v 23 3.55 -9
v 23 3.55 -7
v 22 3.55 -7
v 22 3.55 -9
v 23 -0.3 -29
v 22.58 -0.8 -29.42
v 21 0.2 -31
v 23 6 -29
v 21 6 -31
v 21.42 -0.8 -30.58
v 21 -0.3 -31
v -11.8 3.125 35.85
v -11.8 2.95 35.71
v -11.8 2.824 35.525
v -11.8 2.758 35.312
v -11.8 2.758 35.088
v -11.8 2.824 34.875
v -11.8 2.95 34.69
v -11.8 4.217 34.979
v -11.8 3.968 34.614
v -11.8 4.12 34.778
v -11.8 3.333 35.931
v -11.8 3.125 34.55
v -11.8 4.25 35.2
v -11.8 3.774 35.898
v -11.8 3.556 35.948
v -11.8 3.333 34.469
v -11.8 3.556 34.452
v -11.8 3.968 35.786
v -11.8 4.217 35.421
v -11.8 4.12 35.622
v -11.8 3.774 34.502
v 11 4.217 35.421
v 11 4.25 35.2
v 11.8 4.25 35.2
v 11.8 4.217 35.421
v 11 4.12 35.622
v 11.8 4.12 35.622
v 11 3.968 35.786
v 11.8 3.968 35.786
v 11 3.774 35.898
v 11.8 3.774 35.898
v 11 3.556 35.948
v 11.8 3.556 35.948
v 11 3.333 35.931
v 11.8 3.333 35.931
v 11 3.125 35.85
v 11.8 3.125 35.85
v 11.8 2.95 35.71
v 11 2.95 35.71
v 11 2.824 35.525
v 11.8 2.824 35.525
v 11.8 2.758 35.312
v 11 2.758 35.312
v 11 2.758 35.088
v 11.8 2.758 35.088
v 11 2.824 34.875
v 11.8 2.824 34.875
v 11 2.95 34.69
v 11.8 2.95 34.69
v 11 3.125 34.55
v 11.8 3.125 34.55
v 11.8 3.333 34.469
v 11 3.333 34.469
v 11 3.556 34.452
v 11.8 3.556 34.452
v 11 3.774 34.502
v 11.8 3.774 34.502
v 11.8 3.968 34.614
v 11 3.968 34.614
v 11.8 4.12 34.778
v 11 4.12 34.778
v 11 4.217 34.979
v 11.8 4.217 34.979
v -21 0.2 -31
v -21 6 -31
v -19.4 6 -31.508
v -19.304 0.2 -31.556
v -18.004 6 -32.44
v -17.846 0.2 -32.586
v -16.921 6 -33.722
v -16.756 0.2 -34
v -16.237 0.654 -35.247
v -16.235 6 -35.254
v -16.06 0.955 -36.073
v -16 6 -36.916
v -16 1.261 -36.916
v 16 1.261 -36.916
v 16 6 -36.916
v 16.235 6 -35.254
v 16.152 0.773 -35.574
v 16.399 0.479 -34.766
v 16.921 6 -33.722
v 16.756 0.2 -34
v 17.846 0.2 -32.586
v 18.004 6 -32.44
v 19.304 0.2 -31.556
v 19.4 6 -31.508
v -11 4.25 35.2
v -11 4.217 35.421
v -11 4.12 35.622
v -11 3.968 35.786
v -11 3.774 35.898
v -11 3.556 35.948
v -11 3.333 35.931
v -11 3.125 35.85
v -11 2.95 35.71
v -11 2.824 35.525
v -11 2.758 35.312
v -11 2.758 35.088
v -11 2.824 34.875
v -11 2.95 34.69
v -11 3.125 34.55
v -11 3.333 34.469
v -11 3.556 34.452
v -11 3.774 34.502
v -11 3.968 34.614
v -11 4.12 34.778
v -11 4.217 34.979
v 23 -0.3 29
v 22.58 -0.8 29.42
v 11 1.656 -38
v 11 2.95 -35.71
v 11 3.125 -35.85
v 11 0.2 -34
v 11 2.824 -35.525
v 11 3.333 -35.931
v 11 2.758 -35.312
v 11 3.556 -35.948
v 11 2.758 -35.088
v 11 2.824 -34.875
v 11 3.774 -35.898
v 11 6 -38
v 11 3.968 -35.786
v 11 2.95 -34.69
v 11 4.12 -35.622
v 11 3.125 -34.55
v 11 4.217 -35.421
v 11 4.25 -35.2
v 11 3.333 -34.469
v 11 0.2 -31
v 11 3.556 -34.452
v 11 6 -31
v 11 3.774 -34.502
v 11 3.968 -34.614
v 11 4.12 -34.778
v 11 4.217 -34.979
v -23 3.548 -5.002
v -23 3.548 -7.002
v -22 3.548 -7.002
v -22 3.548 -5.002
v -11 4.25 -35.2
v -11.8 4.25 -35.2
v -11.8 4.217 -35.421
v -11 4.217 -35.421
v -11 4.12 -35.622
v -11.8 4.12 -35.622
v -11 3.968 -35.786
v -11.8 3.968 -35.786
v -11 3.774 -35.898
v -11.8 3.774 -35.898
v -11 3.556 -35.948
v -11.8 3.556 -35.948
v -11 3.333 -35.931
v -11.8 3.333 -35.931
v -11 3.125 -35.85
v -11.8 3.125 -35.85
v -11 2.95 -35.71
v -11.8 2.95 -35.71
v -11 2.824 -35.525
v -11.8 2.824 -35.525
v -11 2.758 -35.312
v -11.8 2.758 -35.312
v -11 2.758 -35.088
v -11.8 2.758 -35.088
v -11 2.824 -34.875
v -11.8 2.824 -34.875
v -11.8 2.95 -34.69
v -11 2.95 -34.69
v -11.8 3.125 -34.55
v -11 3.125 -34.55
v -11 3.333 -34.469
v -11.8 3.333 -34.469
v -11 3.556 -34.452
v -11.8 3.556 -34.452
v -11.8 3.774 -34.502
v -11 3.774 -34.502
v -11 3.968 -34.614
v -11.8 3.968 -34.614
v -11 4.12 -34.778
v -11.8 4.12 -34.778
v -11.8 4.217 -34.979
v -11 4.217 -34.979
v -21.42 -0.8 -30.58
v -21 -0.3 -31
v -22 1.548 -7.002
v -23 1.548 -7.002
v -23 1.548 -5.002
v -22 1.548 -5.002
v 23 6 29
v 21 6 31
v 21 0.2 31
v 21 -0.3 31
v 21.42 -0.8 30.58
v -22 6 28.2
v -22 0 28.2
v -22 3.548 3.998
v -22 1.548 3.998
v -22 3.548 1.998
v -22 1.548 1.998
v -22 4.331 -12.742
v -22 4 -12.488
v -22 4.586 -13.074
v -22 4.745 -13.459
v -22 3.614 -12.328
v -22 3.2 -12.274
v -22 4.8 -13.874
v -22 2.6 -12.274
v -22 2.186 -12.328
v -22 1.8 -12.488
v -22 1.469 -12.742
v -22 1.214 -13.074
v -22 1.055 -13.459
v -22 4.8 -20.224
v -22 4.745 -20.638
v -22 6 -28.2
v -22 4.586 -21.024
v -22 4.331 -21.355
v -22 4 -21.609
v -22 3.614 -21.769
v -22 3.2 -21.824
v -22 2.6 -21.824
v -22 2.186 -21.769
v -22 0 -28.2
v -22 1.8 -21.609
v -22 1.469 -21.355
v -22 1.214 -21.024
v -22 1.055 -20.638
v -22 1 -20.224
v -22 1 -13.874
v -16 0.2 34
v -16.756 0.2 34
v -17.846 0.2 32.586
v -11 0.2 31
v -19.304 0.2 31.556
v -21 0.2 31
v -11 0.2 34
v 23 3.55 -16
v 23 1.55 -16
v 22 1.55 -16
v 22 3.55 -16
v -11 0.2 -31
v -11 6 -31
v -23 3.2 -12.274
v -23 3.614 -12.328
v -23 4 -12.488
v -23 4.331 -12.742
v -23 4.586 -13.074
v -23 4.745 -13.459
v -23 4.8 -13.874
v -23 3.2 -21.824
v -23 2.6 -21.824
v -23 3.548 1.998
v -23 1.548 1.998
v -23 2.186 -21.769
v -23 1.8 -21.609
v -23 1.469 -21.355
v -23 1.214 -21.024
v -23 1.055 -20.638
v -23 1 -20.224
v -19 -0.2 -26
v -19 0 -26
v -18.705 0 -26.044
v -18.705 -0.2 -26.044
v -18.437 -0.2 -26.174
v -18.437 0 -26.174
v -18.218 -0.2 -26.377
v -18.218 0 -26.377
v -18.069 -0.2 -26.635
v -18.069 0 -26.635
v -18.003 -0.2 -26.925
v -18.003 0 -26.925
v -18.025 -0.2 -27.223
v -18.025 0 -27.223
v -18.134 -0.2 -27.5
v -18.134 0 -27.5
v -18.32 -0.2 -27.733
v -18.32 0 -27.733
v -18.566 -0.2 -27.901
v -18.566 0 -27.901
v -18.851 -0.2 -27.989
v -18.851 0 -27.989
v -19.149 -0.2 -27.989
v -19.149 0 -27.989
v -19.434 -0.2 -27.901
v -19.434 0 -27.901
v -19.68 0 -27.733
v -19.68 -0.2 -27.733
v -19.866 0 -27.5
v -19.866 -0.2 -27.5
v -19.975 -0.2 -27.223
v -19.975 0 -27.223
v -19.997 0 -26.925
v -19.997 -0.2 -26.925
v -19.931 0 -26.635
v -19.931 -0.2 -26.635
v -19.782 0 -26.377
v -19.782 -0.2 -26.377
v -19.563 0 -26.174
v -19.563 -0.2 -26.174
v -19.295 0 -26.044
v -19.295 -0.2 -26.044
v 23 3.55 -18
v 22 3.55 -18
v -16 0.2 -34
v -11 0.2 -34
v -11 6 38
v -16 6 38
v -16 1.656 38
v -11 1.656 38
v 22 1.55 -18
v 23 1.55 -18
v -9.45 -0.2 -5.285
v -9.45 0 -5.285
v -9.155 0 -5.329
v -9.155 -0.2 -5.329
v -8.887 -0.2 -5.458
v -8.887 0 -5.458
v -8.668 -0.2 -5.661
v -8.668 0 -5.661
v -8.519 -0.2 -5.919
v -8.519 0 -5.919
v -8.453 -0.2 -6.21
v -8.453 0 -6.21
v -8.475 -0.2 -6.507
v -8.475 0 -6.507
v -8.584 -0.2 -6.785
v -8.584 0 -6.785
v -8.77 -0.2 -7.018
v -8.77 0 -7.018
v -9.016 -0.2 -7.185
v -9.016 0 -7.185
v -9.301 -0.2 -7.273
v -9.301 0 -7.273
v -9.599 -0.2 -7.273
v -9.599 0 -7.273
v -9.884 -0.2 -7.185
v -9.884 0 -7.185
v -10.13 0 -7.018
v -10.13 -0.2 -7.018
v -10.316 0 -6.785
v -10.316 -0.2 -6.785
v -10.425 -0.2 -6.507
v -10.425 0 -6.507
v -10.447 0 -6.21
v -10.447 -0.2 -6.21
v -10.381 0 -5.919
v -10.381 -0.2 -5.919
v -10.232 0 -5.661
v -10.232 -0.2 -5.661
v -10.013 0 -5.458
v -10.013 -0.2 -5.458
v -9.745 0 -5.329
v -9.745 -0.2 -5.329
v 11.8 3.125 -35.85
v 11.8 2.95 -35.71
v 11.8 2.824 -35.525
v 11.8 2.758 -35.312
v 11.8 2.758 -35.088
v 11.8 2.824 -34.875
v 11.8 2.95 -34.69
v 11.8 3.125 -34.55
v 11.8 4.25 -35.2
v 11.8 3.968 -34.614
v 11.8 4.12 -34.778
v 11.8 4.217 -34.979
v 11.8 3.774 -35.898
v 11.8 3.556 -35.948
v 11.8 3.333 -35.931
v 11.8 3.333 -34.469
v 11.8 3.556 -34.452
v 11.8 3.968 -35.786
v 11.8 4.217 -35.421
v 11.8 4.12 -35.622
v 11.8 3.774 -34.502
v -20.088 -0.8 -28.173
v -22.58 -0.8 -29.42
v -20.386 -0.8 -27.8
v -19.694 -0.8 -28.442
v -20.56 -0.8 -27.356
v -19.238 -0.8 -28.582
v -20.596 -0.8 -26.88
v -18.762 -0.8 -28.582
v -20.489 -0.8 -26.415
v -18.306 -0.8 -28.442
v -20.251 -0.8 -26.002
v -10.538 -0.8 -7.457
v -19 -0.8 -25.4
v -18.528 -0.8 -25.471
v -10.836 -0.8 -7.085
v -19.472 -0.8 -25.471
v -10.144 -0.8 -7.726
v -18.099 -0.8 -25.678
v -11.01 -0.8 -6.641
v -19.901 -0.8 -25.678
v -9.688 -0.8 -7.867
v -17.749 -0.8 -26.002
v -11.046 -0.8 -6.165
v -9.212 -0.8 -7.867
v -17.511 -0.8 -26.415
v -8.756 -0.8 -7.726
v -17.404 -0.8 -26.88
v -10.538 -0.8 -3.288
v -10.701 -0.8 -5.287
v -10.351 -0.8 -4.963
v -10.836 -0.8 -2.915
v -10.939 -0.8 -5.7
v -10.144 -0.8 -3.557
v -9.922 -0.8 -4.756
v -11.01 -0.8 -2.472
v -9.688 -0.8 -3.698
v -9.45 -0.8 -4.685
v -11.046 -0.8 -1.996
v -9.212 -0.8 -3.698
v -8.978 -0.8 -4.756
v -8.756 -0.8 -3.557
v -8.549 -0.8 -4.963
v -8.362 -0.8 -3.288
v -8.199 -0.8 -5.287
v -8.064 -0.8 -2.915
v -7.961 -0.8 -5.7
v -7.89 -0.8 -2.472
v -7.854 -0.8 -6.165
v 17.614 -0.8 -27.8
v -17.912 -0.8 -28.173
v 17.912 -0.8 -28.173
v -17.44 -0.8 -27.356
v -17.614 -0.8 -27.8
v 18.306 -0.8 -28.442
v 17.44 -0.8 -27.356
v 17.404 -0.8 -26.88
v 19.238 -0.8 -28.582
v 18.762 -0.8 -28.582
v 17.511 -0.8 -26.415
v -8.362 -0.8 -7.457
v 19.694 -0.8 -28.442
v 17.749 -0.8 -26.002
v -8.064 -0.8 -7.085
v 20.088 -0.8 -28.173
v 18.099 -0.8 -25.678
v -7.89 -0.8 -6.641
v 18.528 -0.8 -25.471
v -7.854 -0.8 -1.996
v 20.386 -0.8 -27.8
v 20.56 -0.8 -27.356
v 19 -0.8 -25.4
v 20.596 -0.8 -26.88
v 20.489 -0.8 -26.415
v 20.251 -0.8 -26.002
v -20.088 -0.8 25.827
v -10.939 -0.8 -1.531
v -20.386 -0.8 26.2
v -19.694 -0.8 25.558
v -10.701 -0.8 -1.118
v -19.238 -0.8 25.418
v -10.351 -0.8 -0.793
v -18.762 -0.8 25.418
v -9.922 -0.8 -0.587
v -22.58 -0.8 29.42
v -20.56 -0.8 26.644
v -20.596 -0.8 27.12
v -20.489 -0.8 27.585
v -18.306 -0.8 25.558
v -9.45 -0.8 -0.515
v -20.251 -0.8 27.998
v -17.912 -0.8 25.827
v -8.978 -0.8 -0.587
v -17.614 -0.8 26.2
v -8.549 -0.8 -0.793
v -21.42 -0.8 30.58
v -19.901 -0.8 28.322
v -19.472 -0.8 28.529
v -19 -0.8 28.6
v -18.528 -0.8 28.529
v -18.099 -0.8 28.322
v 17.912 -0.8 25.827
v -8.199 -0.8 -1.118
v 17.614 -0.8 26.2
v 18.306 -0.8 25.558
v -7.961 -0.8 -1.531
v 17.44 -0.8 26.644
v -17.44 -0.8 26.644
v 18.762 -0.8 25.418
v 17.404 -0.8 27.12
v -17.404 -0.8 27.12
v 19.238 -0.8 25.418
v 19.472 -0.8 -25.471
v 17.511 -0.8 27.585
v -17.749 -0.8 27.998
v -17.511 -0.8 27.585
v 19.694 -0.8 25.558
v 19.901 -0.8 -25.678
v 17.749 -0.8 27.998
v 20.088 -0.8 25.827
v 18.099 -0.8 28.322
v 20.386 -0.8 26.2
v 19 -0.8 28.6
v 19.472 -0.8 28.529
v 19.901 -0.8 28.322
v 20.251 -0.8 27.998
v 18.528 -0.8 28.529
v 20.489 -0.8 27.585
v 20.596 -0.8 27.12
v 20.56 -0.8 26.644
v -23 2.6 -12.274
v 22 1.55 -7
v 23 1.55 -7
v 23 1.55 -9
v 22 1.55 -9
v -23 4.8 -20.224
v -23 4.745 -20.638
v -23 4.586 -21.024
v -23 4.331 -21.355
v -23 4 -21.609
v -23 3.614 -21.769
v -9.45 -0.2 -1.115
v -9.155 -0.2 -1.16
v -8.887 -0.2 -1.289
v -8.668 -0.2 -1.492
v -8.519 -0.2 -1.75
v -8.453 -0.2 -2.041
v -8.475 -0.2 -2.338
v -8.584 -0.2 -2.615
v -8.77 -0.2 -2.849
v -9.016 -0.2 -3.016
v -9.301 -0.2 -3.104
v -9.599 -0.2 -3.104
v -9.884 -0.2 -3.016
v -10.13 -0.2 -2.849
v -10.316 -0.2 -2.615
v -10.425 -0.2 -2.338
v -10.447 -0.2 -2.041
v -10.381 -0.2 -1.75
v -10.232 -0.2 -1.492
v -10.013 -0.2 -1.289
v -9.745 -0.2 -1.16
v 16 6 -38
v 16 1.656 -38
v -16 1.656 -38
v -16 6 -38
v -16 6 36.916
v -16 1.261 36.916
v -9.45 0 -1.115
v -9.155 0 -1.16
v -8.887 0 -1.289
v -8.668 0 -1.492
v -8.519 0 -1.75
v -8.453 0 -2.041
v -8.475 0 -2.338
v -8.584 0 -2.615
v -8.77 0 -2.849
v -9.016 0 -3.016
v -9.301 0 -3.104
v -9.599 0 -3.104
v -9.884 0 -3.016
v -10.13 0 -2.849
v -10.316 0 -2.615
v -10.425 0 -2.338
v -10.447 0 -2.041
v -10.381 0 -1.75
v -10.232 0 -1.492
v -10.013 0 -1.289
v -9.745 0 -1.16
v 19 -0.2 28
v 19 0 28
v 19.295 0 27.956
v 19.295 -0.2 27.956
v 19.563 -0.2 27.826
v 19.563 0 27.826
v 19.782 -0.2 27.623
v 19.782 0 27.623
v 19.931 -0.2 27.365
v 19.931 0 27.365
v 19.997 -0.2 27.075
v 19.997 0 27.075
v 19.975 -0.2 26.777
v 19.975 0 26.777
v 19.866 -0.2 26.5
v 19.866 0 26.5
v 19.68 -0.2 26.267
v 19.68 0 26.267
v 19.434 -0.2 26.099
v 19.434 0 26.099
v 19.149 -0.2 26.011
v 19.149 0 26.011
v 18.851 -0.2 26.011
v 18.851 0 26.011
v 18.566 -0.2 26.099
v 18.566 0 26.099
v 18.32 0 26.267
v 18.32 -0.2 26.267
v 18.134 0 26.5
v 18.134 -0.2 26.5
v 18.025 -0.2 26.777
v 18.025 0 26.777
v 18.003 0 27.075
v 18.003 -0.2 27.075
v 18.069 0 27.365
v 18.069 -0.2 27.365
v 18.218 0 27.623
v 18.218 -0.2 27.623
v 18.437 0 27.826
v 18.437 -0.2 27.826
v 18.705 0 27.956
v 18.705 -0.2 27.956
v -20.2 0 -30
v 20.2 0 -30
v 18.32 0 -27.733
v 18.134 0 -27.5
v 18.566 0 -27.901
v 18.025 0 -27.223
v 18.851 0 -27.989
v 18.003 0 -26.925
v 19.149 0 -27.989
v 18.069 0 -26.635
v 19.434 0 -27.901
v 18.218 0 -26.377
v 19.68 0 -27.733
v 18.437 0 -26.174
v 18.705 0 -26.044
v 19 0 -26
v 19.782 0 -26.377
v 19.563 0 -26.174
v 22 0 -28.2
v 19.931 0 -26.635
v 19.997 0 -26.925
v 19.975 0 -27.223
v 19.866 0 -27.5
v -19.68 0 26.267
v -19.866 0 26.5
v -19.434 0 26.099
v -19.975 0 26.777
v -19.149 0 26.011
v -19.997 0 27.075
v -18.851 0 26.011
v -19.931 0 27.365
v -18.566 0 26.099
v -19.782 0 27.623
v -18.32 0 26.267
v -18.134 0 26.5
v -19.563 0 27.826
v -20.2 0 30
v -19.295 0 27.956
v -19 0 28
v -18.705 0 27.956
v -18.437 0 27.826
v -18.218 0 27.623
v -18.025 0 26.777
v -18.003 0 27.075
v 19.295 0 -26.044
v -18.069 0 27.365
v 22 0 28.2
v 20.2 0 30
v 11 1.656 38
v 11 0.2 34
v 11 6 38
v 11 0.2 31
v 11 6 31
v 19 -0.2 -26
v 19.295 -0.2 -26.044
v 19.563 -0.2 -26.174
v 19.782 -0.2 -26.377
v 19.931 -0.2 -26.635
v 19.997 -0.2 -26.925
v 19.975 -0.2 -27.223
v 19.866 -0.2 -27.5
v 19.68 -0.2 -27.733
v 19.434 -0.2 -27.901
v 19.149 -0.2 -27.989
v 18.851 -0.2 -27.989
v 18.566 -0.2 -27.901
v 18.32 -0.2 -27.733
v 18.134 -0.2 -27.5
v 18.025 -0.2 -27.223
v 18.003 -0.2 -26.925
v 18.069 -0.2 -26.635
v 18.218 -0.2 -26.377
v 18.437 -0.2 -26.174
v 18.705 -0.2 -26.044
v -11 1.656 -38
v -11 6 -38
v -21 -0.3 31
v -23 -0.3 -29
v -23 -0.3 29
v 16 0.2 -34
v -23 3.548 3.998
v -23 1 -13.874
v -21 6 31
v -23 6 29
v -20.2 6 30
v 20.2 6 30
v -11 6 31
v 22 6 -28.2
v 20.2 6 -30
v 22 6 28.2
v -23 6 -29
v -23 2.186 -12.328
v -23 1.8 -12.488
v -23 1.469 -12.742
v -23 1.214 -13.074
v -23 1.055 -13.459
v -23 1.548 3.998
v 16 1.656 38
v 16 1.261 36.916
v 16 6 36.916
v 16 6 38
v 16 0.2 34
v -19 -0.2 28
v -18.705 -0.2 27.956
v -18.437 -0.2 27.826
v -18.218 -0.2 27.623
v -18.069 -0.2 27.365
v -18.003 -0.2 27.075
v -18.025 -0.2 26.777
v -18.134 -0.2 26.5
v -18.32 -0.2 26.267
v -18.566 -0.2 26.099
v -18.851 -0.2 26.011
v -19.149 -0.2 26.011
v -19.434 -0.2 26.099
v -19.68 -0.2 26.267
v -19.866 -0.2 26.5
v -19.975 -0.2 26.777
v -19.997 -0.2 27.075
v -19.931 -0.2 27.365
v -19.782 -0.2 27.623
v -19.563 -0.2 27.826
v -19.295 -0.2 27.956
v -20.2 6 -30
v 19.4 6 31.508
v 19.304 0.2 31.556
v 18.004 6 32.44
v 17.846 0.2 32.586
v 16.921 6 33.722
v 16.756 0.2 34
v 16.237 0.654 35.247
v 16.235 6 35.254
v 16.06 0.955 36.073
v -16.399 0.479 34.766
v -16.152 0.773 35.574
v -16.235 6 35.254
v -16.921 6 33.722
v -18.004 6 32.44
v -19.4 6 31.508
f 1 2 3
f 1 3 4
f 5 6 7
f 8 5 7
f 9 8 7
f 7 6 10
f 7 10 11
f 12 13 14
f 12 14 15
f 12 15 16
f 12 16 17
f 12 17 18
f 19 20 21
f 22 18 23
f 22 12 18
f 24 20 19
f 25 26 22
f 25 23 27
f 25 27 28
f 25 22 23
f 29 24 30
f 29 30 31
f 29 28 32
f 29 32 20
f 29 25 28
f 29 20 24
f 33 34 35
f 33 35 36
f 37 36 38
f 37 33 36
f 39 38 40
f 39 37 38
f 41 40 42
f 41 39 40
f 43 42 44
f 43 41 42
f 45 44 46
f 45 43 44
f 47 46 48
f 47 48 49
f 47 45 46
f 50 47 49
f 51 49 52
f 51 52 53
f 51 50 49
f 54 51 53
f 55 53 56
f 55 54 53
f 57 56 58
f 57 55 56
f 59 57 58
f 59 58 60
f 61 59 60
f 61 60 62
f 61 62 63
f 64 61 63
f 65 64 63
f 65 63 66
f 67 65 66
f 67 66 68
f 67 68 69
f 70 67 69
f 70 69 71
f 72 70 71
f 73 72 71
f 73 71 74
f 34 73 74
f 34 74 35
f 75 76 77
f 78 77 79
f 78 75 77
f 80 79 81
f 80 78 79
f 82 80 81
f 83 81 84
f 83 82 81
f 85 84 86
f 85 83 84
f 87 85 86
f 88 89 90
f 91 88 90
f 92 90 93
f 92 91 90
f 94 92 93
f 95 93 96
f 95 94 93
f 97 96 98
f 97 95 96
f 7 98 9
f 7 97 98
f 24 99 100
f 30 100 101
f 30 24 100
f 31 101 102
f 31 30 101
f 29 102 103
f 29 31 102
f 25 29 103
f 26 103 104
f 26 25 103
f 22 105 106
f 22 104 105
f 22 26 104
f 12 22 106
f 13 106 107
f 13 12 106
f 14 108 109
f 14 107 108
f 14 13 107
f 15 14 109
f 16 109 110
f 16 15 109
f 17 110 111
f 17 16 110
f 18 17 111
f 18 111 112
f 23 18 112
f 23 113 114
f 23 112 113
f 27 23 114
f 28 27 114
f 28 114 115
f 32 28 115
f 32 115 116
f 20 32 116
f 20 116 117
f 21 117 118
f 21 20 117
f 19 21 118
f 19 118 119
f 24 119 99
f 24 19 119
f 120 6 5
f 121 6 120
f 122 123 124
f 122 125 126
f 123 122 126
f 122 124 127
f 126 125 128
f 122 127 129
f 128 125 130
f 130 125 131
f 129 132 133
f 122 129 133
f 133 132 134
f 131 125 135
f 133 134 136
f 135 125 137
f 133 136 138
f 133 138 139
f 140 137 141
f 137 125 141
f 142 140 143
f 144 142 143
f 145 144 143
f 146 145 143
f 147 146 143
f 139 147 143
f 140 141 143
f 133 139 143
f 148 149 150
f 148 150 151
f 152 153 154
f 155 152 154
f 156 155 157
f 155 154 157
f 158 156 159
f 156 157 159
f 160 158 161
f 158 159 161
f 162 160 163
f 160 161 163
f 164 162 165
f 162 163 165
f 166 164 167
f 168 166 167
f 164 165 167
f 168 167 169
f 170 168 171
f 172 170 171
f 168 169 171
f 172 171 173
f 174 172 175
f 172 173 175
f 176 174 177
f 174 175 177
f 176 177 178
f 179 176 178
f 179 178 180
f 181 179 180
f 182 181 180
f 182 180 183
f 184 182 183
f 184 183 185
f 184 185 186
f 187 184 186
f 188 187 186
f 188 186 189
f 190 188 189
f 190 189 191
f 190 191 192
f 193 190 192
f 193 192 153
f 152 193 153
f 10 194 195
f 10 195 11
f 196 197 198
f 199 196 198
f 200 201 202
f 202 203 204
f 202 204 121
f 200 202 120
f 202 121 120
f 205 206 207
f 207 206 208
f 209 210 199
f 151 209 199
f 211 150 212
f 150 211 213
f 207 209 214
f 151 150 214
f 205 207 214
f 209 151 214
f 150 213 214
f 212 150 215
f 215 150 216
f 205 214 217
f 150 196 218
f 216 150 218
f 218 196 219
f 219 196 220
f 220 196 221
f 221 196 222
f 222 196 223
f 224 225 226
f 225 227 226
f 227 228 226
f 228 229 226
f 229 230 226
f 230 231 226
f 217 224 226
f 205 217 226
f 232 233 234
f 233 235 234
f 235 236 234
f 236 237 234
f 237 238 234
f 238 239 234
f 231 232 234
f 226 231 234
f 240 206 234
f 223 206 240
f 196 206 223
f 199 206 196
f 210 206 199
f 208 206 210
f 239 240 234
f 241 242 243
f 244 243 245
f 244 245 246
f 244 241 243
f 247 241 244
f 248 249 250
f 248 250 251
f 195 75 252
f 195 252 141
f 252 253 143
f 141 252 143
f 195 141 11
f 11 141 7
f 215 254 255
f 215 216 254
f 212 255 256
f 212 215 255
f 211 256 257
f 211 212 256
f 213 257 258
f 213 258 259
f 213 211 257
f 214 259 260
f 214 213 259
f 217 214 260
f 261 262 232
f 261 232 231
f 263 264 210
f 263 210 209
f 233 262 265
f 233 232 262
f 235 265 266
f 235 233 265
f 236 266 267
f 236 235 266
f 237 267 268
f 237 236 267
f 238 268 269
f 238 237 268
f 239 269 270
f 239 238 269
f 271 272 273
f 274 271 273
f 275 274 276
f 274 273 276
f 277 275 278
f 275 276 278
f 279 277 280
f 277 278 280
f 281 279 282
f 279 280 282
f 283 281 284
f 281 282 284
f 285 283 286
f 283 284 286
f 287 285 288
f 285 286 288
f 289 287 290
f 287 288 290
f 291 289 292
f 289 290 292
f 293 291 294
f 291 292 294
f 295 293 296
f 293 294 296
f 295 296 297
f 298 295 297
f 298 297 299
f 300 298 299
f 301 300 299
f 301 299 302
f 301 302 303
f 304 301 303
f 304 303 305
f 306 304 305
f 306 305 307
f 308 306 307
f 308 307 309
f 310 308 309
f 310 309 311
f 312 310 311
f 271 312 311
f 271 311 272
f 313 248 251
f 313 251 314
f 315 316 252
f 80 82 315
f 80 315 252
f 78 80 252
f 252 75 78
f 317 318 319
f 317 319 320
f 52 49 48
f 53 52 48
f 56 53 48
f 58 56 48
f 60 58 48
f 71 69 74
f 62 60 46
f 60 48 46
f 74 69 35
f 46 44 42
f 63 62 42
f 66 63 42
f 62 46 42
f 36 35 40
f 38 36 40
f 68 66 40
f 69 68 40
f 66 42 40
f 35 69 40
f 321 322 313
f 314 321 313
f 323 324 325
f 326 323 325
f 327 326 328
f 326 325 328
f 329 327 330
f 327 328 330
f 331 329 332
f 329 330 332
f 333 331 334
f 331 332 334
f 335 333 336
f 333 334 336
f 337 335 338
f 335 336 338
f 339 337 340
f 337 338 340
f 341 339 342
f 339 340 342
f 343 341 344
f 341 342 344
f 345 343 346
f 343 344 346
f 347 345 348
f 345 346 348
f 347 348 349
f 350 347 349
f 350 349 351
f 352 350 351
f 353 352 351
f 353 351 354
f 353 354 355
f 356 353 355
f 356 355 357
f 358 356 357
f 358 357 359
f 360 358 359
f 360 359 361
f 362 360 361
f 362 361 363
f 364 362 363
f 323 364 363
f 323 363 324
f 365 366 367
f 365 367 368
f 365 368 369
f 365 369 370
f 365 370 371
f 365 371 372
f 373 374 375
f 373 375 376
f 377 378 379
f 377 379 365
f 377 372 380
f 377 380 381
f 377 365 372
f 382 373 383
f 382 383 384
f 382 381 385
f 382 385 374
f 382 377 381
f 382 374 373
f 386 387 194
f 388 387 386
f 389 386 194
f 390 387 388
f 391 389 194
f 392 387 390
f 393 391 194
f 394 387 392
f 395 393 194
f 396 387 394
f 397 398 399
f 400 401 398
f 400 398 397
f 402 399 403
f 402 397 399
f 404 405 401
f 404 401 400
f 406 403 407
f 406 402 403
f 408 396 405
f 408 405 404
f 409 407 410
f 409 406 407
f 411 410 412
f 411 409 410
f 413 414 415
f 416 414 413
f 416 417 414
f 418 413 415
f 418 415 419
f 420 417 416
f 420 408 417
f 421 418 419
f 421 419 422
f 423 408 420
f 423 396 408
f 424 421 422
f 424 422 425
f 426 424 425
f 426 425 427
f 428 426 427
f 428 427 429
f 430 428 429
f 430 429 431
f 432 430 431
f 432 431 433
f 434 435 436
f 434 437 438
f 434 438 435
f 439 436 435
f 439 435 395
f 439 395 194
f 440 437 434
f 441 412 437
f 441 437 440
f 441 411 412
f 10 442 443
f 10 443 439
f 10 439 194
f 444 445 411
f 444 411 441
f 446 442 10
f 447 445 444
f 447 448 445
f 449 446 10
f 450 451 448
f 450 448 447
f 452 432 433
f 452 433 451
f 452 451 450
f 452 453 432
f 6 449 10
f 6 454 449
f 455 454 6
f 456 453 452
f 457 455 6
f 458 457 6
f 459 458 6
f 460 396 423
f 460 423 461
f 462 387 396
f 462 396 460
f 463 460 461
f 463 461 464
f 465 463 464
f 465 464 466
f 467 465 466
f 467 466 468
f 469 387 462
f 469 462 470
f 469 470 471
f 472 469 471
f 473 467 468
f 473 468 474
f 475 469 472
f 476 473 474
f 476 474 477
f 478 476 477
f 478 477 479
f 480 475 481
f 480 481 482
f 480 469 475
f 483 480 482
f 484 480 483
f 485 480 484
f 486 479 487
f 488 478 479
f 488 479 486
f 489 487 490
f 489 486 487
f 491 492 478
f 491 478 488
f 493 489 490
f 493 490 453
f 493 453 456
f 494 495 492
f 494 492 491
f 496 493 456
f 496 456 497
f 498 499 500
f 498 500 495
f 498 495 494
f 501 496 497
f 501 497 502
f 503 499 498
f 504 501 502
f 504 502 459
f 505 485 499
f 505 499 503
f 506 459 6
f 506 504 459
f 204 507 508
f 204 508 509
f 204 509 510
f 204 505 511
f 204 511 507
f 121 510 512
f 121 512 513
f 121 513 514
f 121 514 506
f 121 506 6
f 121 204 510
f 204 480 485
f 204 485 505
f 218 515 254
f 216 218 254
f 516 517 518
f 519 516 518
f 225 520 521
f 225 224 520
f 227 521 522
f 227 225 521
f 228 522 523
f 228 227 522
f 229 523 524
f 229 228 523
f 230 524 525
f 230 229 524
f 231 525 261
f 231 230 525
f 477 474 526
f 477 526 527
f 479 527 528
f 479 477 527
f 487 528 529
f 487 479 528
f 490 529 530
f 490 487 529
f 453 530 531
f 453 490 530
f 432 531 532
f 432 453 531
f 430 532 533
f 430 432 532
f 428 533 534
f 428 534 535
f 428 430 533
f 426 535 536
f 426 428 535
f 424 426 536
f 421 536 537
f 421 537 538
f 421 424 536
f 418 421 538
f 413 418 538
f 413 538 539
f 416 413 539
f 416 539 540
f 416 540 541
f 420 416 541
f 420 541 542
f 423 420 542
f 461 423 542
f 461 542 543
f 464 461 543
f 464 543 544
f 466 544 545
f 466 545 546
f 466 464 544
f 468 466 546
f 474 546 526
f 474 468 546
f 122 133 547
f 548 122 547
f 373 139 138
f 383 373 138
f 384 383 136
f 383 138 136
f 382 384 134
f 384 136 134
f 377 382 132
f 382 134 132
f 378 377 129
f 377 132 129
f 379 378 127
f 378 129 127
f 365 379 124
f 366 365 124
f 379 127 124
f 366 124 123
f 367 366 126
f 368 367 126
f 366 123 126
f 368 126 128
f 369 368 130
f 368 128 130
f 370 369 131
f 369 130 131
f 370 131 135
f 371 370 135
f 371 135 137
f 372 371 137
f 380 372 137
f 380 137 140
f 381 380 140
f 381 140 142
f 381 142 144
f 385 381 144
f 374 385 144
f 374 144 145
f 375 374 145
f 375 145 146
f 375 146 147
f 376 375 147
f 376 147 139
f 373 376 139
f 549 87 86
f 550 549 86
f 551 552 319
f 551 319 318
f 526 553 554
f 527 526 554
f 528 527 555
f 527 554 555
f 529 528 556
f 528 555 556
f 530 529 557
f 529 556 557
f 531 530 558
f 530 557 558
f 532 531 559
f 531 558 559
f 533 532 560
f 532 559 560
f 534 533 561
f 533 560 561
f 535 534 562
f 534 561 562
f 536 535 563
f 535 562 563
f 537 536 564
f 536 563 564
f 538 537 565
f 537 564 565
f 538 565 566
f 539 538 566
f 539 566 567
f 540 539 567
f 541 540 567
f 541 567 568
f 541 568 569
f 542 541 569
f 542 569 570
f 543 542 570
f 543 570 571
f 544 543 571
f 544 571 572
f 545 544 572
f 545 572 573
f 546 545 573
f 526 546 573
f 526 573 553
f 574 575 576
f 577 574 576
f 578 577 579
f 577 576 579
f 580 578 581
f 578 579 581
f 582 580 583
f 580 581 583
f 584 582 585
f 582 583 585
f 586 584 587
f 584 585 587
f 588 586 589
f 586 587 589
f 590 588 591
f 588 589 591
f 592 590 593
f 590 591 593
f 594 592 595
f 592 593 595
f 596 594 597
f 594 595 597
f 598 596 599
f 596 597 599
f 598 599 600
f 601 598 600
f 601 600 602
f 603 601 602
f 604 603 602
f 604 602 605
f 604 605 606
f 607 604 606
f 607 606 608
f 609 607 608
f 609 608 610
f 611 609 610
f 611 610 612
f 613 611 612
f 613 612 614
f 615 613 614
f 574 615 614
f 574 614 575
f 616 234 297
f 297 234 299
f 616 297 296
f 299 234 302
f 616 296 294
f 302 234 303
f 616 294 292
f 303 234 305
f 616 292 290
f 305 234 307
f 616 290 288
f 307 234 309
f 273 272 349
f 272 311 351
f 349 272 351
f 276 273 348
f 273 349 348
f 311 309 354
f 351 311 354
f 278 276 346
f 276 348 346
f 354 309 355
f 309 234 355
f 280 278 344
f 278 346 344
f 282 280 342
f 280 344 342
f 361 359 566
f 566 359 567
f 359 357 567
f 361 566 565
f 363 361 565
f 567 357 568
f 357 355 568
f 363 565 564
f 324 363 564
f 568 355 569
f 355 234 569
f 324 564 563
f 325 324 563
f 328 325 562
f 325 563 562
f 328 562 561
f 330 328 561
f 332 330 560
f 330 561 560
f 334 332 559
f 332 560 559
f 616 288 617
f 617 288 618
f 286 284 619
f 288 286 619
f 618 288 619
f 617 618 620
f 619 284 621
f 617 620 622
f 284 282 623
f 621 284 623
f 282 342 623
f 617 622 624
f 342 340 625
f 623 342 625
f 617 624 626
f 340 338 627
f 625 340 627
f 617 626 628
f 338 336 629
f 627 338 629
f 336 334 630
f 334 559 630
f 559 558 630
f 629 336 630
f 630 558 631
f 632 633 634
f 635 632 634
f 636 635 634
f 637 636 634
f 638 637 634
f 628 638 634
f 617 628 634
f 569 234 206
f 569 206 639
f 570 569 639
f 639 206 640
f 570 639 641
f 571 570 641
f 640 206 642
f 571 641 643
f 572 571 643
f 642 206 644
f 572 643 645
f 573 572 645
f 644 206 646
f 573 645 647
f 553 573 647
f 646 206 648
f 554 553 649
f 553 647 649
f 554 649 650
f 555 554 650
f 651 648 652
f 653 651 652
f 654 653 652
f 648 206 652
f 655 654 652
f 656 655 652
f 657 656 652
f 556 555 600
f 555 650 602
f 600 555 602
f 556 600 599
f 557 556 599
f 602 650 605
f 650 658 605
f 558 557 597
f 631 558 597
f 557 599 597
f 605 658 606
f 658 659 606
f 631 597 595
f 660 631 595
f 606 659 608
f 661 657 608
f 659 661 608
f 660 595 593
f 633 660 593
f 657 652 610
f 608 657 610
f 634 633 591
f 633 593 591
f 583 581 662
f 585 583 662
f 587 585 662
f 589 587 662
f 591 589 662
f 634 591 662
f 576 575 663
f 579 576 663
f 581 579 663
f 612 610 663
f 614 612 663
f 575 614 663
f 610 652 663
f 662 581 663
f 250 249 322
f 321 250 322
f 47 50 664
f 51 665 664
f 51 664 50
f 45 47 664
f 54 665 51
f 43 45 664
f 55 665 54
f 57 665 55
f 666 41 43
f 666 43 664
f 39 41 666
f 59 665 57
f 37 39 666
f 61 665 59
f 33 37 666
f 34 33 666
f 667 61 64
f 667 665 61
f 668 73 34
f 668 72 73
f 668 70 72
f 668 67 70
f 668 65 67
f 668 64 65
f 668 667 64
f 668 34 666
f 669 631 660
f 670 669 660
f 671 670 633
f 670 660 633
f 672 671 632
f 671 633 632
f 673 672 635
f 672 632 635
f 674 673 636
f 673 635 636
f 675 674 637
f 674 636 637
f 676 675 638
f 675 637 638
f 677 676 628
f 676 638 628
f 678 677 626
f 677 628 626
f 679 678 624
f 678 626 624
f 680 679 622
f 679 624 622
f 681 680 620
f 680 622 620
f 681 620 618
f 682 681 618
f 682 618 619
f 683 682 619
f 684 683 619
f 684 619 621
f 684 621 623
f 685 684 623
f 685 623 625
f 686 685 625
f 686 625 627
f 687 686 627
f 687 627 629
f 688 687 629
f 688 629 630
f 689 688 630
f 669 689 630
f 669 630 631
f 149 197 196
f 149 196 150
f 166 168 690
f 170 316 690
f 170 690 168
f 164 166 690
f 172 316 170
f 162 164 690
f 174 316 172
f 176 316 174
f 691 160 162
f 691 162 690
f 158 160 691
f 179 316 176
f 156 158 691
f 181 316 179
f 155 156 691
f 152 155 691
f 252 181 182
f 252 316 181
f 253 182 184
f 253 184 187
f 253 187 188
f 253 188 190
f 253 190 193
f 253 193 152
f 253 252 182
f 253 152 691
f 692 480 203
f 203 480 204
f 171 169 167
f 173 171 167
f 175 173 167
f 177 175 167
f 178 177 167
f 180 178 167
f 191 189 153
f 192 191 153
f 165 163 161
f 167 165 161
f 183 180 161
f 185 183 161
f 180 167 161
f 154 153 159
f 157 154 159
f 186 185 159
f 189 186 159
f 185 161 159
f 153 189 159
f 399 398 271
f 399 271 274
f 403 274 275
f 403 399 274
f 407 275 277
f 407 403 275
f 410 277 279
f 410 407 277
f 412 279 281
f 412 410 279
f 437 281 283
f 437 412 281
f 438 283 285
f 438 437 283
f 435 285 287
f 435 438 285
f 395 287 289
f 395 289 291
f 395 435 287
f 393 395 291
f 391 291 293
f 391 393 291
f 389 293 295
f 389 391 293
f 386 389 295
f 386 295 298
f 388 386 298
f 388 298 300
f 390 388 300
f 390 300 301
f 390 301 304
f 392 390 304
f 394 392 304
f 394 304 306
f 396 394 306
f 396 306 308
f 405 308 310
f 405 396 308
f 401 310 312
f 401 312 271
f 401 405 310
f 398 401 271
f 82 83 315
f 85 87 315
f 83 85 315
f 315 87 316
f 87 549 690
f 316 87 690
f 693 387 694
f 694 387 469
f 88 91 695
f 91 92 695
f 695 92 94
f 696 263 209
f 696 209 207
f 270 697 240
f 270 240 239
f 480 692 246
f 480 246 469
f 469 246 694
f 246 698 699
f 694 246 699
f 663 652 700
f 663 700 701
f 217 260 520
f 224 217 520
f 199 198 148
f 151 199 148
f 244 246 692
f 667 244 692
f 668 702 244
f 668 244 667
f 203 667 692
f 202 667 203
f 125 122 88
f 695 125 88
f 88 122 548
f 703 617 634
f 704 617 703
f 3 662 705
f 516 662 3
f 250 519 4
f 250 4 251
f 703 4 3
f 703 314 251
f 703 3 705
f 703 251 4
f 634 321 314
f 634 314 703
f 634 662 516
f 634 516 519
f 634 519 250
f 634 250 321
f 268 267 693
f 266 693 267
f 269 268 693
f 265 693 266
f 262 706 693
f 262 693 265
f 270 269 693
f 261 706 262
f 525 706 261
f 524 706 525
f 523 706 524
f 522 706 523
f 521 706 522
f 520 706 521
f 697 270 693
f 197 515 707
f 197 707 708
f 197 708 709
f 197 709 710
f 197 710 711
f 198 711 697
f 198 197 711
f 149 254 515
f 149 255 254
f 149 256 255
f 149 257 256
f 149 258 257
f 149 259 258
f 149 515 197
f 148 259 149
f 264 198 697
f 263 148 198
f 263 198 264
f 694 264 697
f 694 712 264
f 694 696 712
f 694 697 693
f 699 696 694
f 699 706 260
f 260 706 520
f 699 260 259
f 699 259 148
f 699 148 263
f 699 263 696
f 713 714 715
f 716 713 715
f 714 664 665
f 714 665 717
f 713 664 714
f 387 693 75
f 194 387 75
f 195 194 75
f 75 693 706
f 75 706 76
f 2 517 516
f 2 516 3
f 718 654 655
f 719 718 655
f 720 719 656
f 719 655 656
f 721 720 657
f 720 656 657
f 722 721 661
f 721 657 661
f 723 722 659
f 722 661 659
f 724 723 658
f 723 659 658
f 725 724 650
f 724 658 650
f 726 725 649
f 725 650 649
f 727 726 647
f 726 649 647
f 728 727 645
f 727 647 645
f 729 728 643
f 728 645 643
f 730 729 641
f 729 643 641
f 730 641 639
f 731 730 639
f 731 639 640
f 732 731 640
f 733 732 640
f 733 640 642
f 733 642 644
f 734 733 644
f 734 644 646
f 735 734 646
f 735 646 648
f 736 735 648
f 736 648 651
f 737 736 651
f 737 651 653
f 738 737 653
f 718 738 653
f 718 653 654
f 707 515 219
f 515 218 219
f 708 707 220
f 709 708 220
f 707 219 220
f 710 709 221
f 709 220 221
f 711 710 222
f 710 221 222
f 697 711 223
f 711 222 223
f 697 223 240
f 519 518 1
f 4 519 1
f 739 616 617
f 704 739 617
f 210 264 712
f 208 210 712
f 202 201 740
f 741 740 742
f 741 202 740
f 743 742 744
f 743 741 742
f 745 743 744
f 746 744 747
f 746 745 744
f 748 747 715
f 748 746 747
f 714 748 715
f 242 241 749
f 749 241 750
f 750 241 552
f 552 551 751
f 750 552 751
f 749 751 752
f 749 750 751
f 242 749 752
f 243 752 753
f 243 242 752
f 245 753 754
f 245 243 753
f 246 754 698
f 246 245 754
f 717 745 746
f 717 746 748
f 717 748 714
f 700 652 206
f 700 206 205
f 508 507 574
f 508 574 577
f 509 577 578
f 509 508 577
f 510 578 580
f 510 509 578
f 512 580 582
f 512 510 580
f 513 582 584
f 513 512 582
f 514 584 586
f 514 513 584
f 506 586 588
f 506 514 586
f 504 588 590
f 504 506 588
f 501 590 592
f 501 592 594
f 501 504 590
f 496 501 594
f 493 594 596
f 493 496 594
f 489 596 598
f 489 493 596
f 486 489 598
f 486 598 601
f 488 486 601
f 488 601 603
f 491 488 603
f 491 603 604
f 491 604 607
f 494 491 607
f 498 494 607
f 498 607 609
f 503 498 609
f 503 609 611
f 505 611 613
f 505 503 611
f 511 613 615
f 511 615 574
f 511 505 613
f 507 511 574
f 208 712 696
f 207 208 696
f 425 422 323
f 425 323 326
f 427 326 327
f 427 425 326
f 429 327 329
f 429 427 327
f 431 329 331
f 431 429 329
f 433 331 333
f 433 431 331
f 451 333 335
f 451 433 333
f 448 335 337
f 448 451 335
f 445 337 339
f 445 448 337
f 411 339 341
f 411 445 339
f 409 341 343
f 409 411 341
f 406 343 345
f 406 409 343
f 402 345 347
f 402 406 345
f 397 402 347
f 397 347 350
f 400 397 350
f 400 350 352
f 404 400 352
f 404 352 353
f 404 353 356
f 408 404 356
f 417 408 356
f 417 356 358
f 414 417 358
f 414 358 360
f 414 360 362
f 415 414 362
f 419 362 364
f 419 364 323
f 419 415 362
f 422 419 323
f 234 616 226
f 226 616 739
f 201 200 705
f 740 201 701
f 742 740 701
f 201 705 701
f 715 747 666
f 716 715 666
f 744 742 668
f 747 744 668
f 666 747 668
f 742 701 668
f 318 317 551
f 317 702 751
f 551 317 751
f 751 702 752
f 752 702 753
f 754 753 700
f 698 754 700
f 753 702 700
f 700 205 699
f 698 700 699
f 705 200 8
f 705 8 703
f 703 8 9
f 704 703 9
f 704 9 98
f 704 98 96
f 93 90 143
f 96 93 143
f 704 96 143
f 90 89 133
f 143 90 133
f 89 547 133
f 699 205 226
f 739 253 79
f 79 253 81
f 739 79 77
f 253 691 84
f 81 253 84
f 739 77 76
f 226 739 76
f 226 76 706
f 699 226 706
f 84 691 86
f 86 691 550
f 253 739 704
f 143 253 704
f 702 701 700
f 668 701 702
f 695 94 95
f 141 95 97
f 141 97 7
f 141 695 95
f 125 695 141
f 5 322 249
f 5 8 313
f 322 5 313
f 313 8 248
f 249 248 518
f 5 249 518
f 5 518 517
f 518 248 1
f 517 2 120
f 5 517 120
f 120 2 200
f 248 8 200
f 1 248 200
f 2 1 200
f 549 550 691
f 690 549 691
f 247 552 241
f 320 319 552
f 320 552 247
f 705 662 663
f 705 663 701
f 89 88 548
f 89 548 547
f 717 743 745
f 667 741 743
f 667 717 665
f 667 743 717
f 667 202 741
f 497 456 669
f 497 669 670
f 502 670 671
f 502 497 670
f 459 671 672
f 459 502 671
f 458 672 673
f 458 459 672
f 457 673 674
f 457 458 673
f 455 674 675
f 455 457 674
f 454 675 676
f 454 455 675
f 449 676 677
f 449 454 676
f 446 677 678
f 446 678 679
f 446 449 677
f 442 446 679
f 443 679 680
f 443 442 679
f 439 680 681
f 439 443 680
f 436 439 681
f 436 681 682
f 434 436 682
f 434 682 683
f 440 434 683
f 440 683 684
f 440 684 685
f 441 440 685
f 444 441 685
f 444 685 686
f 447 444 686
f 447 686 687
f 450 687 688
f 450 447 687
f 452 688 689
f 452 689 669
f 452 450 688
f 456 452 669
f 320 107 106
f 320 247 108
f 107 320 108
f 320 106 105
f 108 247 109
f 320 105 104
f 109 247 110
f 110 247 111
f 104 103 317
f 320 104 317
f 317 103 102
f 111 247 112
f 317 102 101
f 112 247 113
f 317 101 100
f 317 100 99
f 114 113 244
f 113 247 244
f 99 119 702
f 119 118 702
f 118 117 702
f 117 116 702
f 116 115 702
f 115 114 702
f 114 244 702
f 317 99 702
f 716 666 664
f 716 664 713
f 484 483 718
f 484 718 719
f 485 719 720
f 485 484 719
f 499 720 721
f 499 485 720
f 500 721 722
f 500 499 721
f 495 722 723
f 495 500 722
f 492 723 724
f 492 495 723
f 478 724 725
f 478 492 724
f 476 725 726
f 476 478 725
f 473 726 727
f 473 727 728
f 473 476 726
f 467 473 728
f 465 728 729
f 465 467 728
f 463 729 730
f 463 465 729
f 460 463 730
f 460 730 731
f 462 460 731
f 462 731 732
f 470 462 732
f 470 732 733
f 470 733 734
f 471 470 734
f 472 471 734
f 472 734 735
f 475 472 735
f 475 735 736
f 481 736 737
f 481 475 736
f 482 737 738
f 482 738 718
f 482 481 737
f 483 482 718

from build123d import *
from OCP.BRepFilletAPI import BRepFilletAPI_MakeChamfer

# Parameters (mm, degrees)
SKETCH1_W                   = 46
SKETCH1_H                   = 62
SKETCH1_W_2                 = 44
SKETCH1_H_2                 = 60
BOSS_EXTRUDE1_DEPTH         = 6
SKETCH2_W                   = 46
SKETCH2_H                   = 62
BOSS_EXTRUDE2_DEPTH         = 0.8
SKETCH3_W                   = 44
SKETCH3_H                   = 60
SKETCH3_R                   = 1
BOSS_EXTRUDE3_DEPTH         = 6
SKETCH7_W                   = 44
SKETCH7_H                   = 60
CUT_EXTRUDE3_DEPTH          = 19.6
SKETCH3_5_R                 = 1
CUT_EXTRUDE7_DEPTH          = 10
SKETCH14_R                  = 1
CUT_EXTRUDE12_DEPTH         = 4.5
CHAMFER5_SIZE               = 0.6
CHAMFER7_SIZE               = 0.5
CHAMFER7_SIZE2              = 0.419549816
CHAMFER9_SIZE               = 1.8
CHAMFER10_SIZE              = 2
SKETCH15_W                  = 9.55
SKETCH15_H                  = 3.8
CUT_EXTRUDE13_DEPTH         = 10
FILLET6_R                   = 1.6
SKETCH17_W                  = 2
SKETCH17_H                  = 2
CUT_EXTRUDE14_DEPTH         = 10
SKETCH19_W                  = 5
SKETCH19_H                  = 5.8
BOSS_EXTRUDE6_DEPTH         = 7
CHAMFER11_SIZE              = 4
CHAMFER11_SIZE2             = 1.455880937
CUT_EXTRUDE15_START         = -0.8
SKETCH20_R                  = 0.75
CUT_EXTRUDE15_DEPTH         = 23.6
CHAMFER11_OF_MIRROR17_SIZE  = 4
CHAMFER11_OF_MIRROR17_SIZE2 = 1.455880937
FILLET7_R                   = 6
SKETCH21_W                  = 2
SKETCH21_H                  = 2
CUT_EXTRUDE16_DEPTH         = 10


with BuildPart() as part:
    # Sketch1 → Boss-Extrude1 (new body)
    with BuildSketch(Plane(origin=(0, 0, 0), x_dir=(1, 0, 0), z_dir=(0, 1, 0))):
        Rectangle(SKETCH1_W, SKETCH1_H)
        Rectangle(SKETCH1_W_2, SKETCH1_H_2, mode=Mode.SUBTRACT)
    extrude(amount=BOSS_EXTRUDE1_DEPTH)

    # Sketch2 → Boss-Extrude2 (add)
    with BuildSketch(Plane.XZ):
        Rectangle(SKETCH2_W, SKETCH2_H)
    extrude(amount=BOSS_EXTRUDE2_DEPTH)

    # Sketch3 → Boss-Extrude3 (add)
    # profile 1 of 4: a face of its own
    with BuildSketch(Plane(origin=(0, 0, 0), x_dir=(1, 0, 0), z_dir=(0, 1, 0))):
        Rectangle(SKETCH3_W, SKETCH3_H)
        with Locations(Location((-19, -27, 0), (0, 0, 90))):
            Circle(SKETCH3_R, mode=Mode.SUBTRACT)
        with Locations(Location((19, -27, 0), (0, 0, 270))):
            Circle(SKETCH3_R, mode=Mode.SUBTRACT)
        with Locations(Location((-19, 27, 0), (0, 0, 270))):
            Circle(SKETCH3_R, mode=Mode.SUBTRACT)
        with Locations(Location((19, 27, 0), (0, 0, 90))):
            Circle(SKETCH3_R, mode=Mode.SUBTRACT)
    # profile 2 of 4: a face of its own
    with BuildSketch(Plane(origin=(0, 0, 0), x_dir=(1, 0, 0), z_dir=(0, 1, 0))):
        Rectangle(SKETCH3_W, SKETCH3_H)
        with Locations(Location((-19, -27, 0), (0, 0, 90))):
            Circle(SKETCH3_R, mode=Mode.SUBTRACT)
        with Locations(Location((19, -27, 0), (0, 0, 270))):
            Circle(SKETCH3_R, mode=Mode.SUBTRACT)
        with Locations(Location((-19, 27, 0), (0, 0, 270))):
            Circle(SKETCH3_R, mode=Mode.SUBTRACT)
        with Locations(Location((19, 27, 0), (0, 0, 90))):
            Circle(SKETCH3_R, mode=Mode.SUBTRACT)
    # profile 3 of 4: a face of its own
    with BuildSketch(Plane(origin=(0, 0, 0), x_dir=(1, 0, 0), z_dir=(0, 1, 0))):
        Rectangle(SKETCH3_W, SKETCH3_H)
        with Locations(Location((-19, -27, 0), (0, 0, 90))):
            Circle(SKETCH3_R, mode=Mode.SUBTRACT)
        with Locations(Location((19, -27, 0), (0, 0, 270))):
            Circle(SKETCH3_R, mode=Mode.SUBTRACT)
        with Locations(Location((-19, 27, 0), (0, 0, 270))):
            Circle(SKETCH3_R, mode=Mode.SUBTRACT)
        with Locations(Location((19, 27, 0), (0, 0, 90))):
            Circle(SKETCH3_R, mode=Mode.SUBTRACT)
    # profile 4 of 4: a face of its own
    with BuildSketch(Plane(origin=(0, 0, 0), x_dir=(1, 0, 0), z_dir=(0, 1, 0))):
        Rectangle(SKETCH3_W, SKETCH3_H)
        with Locations(Location((-19, -27, 0), (0, 0, 90))):
            Circle(SKETCH3_R, mode=Mode.SUBTRACT)
        with Locations(Location((19, -27, 0), (0, 0, 270))):
            Circle(SKETCH3_R, mode=Mode.SUBTRACT)
        with Locations(Location((-19, 27, 0), (0, 0, 270))):
            Circle(SKETCH3_R, mode=Mode.SUBTRACT)
        with Locations(Location((19, 27, 0), (0, 0, 90))):
            Circle(SKETCH3_R, mode=Mode.SUBTRACT)
    extrude(amount=BOSS_EXTRUDE3_DEPTH)

    # Sketch7 → Cut-Extrude3 (cut)
    with BuildSketch(Plane(origin=(0, 0, 0), x_dir=(1, 0, 0), z_dir=(0, 1, 0))):
        Rectangle(SKETCH7_W, SKETCH7_H)
    extrude(amount=CUT_EXTRUDE3_DEPTH, mode=Mode.SUBTRACT)

    # Sketch3<5> → Cut-Extrude7 (cut)
    with BuildSketch(Plane(origin=(0, 0, 0), x_dir=(1, 0, 0), z_dir=(0, 1, 0))):
        with Locations(Location((-19, 27, 0), (0, 0, 270))):
            Circle(SKETCH3_5_R)
        with Locations(Location((19, 27, 0), (0, 0, 270))):
            Circle(SKETCH3_5_R)
        with Locations(Location((19, -27, 0), (0, 0, 270))):
            Circle(SKETCH3_5_R)
        with Locations(Location((-19, -27, 0), (0, 0, 270))):
            Circle(SKETCH3_5_R)
    extrude(amount=-CUT_EXTRUDE7_DEPTH, mode=Mode.SUBTRACT)

    # Sketch14 → Cut-Extrude12 (cut)
    with BuildSketch(Plane(origin=(0, 0, 0), x_dir=(1, 0, 0), z_dir=(0, 1, 0))):
        with Locations(Location((-9.45, 6.284530189, 0), (0, 0, 270))):
            Circle(SKETCH14_R)
        with Locations(Location((-9.45, 2.115469811, 0), (0, 0, 270))):
            Circle(SKETCH14_R)
    extrude(amount=-CUT_EXTRUDE12_DEPTH, mode=Mode.SUBTRACT)

    # Chamfer5
    chamfer5_edges = [part.edges().sort_by_distance(p)[0] for p in [
        (-19, -0.8, -28),
        (-9.45, -0.8, -7.284530189),
        (-9.45, -0.8, -3.115469811),
        (-19, -0.8, 26),
        (19, -0.8, 26),
        (19, -0.8, -28),
    ]]
    chamfer(chamfer5_edges, length=CHAMFER5_SIZE)

    # Chamfer7: one chamfer whose edges measure the first distance from different faces: ONE call of the kernel's chamfer builder (chamfer() names one face for all edges)
    chamfer7_edges_1 = [part.edges().sort_by_distance(p)[0] for p in [
        (-23, -0.8, 0),
    ]]
    chamfer7_side_1 = [part.faces().sort_by_distance(p)[0] for p in [
        (-23, 2.6, 0),
    ]]
    chamfer7_edges_2 = [part.edges().sort_by_distance(p)[0] for p in [
        (0, -0.8, -31),
    ]]
    chamfer7_side_2 = [part.faces().sort_by_distance(p)[0] for p in [
        (0, 2.6, -31),
    ]]
    chamfer7_edges_3 = [part.edges().sort_by_distance(p)[0] for p in [
        (23, -0.8, 0),
    ]]
    chamfer7_side_3 = [part.faces().sort_by_distance(p)[0] for p in [
        (23, 2.6, 0),
    ]]
    chamfer7_edges_4 = [part.edges().sort_by_distance(p)[0] for p in [
        (0, -0.8, 31),
    ]]
    chamfer7_side_4 = [part.faces().sort_by_distance(p)[0] for p in [
        (0, 2.6, 31),
    ]]
    chamfer7 = BRepFilletAPI_MakeChamfer(part.part.solid().wrapped)
    for e in chamfer7_edges_1:
        chamfer7.Add(CHAMFER7_SIZE, CHAMFER7_SIZE2, e.wrapped, chamfer7_side_1[0].wrapped)  # the first distance lies on this face
    for e in chamfer7_edges_2:
        chamfer7.Add(CHAMFER7_SIZE, CHAMFER7_SIZE2, e.wrapped, chamfer7_side_2[0].wrapped)  # the first distance lies on this face
    for e in chamfer7_edges_3:
        chamfer7.Add(CHAMFER7_SIZE, CHAMFER7_SIZE2, e.wrapped, chamfer7_side_3[0].wrapped)  # the first distance lies on this face
    for e in chamfer7_edges_4:
        chamfer7.Add(CHAMFER7_SIZE, CHAMFER7_SIZE2, e.wrapped, chamfer7_side_4[0].wrapped)  # the first distance lies on this face
    add(Compound.cast(chamfer7.Shape()), mode=Mode.REPLACE)

    # Chamfer9
    chamfer9_edges = [part.edges().sort_by_distance(p)[0] for p in [
        (-22, 3, -30),
        (-22, 3, 30),
        (22, 3, 30),
        (22, 3, -30),
    ]]
    chamfer(chamfer9_edges, length=CHAMFER9_SIZE)

    # Chamfer10
    # the kernel refuses this chamfer: 2 mm, written as the material it takes off along each edge
    with BuildSketch(Plane(origin=(23, -5.443365976, 31), x_dir=(-0.9996219169112968, 1.5667810843409742e-15, 0.027495876610585647), z_dir=(0, 1, 0)), Plane(origin=(-23, 11.143365976, 31), x_dir=(0.9996219169112968, 0, 0.027495876610585647), z_dir=(0, -1, 0)), Plane(origin=(-23, 11.143365976, -31), x_dir=(-0.027495876610585647, 0, 0.9996219169112968), z_dir=(0, -1, 0)), Plane(origin=(23, -5.443365976, -31), x_dir=(0.027495876610585647, 0, 0.9996219169112968), z_dir=(0, 1, 0))) as chamfer10_piece_1:
        Polygon((CHAMFER10_SIZE * 0.999621916911, -CHAMFER10_SIZE * 0.0274958766106), (-CHAMFER10_SIZE * 0.0274958766106, -CHAMFER10_SIZE * 0.999621916911), (0, 0), align=None)
    extrude(amount=16.586731952, mode=Mode.SUBTRACT)

    # Sketch15 → Cut-Extrude13 (cut)
    with BuildSketch(Plane(origin=(-23, 0, -8), x_dir=(0, 0, -1), z_dir=(1, 0, 0))):
        with Locations((9.048605705, 2.9)):
            Rectangle(SKETCH15_W, SKETCH15_H)
    extrude(amount=CUT_EXTRUDE13_DEPTH, mode=Mode.SUBTRACT)

    # Fillet6
    fillet6_edges = [part.edges().sort_by_distance(p)[0] for p in [
        (-22.5, 4.8, -12.273605705),
        (-22.5, 1, -12.273605705),
        (-22.5, 1, -21.823605705),
        (-22.5, 4.8, -21.823605705),
    ]]
    fillet(fillet6_edges, radius=FILLET6_R)

    # Sketch17 → Cut-Extrude14 (cut)
    with BuildSketch(Plane.ZY.offset(23)):
        with Locations((-6.001655918, 2.54848205)):
            Rectangle(SKETCH17_W, SKETCH17_H)
        with Locations((2.998344082, 2.54848205)):
            Rectangle(SKETCH17_W, SKETCH17_H)
    extrude(amount=-CUT_EXTRUDE14_DEPTH, mode=Mode.SUBTRACT)

    # Sketch19 → Boss-Extrude6 (add)
    with BuildSketch(Plane.XY.offset(31)):
        with Locations((-13.5, 3.1)):
            Rectangle(SKETCH19_W, SKETCH19_H)
        with Locations((13.5, 3.1)):
            Rectangle(SKETCH19_W, SKETCH19_H)
    boss_extrude6 = extrude(amount=BOSS_EXTRUDE6_DEPTH)

    # Chamfer11: one chamfer whose edges measure the first distance from different faces: ONE call of the kernel's chamfer builder (chamfer() names one face for all edges)
    chamfer11_edges_1 = [part.edges().sort_by_distance(p)[0] for p in [
        (-13.5, 0.2, 38),
    ]]
    chamfer11_side_1 = [part.faces().sort_by_distance(p)[0] for p in [
        (-13.5, 0.2, 34.5),
    ]]
    chamfer11_edges_2 = [part.edges().sort_by_distance(p)[0] for p in [
        (13.5, 0.2, 38),
    ]]
    chamfer11_side_2 = [part.faces().sort_by_distance(p)[0] for p in [
        (13.5, 0.2, 34.5),
    ]]
    chamfer11 = BRepFilletAPI_MakeChamfer(part.part.solid().wrapped)
    for e in chamfer11_edges_1:
        chamfer11.Add(CHAMFER11_SIZE, CHAMFER11_SIZE2, e.wrapped, chamfer11_side_1[0].wrapped)  # the first distance lies on this face
    for e in chamfer11_edges_2:
        chamfer11.Add(CHAMFER11_SIZE, CHAMFER11_SIZE2, e.wrapped, chamfer11_side_2[0].wrapped)  # the first distance lies on this face
    add(Compound.cast(chamfer11.Shape()), mode=Mode.REPLACE)

    # Sketch20 → Cut-Extrude15 (cut)
    with BuildSketch(Plane(origin=(-11, 0, 0), x_dir=(0, 0, -1), z_dir=(1, 0, 0)).offset(CUT_EXTRUDE15_START)):
        with Locations(Location((-35.2, 3.5, 0), (0, 0, 90))):
            Circle(SKETCH20_R)
    cut_extrude15 = extrude(amount=CUT_EXTRUDE15_DEPTH, mode=Mode.SUBTRACT)

    # Mirror17: Boss-Extrude6, Cut-Extrude15 across plane
    add(boss_extrude6.mirror(Plane.XY))
    add(cut_extrude15.mirror(Plane.XY), mode=Mode.SUBTRACT)

    # Chamfer11 of Mirror17: one chamfer whose edges measure the first distance from different faces: ONE call of the kernel's chamfer builder (chamfer() names one face for all edges)
    chamfer11_of_mirror17_edges_1 = [part.edges().sort_by_distance(p)[0] for p in [
        (-13.5, 0.2, -38),
    ]]
    chamfer11_of_mirror17_side_1 = [part.faces().sort_by_distance(p)[0] for p in [
        (-13.5, 0.2, -34.5),
    ]]
    chamfer11_of_mirror17_edges_2 = [part.edges().sort_by_distance(p)[0] for p in [
        (13.5, 0.2, -38),
    ]]
    chamfer11_of_mirror17_side_2 = [part.faces().sort_by_distance(p)[0] for p in [
        (13.5, 0.2, -34.5),
    ]]
    chamfer11_of_mirror17 = BRepFilletAPI_MakeChamfer(part.part.solid().wrapped)
    for e in chamfer11_of_mirror17_edges_1:
        chamfer11_of_mirror17.Add(CHAMFER11_OF_MIRROR17_SIZE, CHAMFER11_OF_MIRROR17_SIZE2, e.wrapped, chamfer11_of_mirror17_side_1[0].wrapped)  # the first distance lies on this face
    for e in chamfer11_of_mirror17_edges_2:
        chamfer11_of_mirror17.Add(CHAMFER11_OF_MIRROR17_SIZE, CHAMFER11_OF_MIRROR17_SIZE2, e.wrapped, chamfer11_of_mirror17_side_2[0].wrapped)  # the first distance lies on this face
    add(Compound.cast(chamfer11_of_mirror17.Shape()), mode=Mode.REPLACE)

    # Fillet7
    # the kernel refuses this fillet: 6 mm, written as the material it adds along each edge
    with BuildSketch(Plane(origin=(16, 0.2, 31), x_dir=(1, 0, 0), z_dir=(0, 1, 0))) as fillet7_piece_1_section:
        with BuildLine():
            CenterArc((6, -5.916079783), FILLET7_R, 99.594068227, 80.405931773)
            Line((0, -5.916079783), (-0.12, -5.916079783))
            Line((-0.12, -5.916079783), (-0.12, 0))
            Line((-0.12, 0), (0, 0.12))
            ThreePointArc((0, 0.12), (2.5, 0.12), (4.98, 0.118321596))
            Line((4.98, 0.118321596), (5, 0))
        make_face()
    fillet7_piece_1 = extrude(amount=5.8, mode=Mode.PRIVATE)
    fillet7_piece_1 = split(fillet7_piece_1, bisect_by=Plane(origin=(16.527662271, 0.235819169, 34.098412357), z_dir=(0, 0.9396926207859081, -0.34202014332566943)), keep=Keep.TOP, mode=Mode.PRIVATE)
    add(fillet7_piece_1)
    with BuildSketch(Plane(origin=(-16, 0.2, 31), x_dir=(-1, 0, 0), z_dir=(0, 1, 0))) as fillet7_piece_2_section:
        with BuildLine():
            CenterArc((6, 5.916079783), FILLET7_R, 180, 80.405931773)
            Line((0, 5.916079783), (-0.12, 5.916079783))
            Line((-0.12, 5.916079783), (-0.12, 0))
            Line((-0.12, 0), (0, -0.12))
            ThreePointArc((0, -0.12), (2.5, -0.12), (4.98, -0.118321596))
            Line((4.98, -0.118321596), (5, 0))
        make_face()
    fillet7_piece_2 = extrude(amount=5.8, mode=Mode.PRIVATE)
    fillet7_piece_2 = split(fillet7_piece_2, bisect_by=Plane(origin=(-16.527662271, 0.235819169, 34.098412357), z_dir=(0, 0.9396926207859081, -0.34202014332566943)), keep=Keep.TOP, mode=Mode.PRIVATE)
    add(fillet7_piece_2)
    with BuildSketch(Plane(origin=(-16, 0.2, -31), x_dir=(0, 0, -1), z_dir=(0, 1, 0))) as fillet7_piece_3_section:
        with BuildLine():
            CenterArc((5.916079783, 6), FILLET7_R, 189.594068227, 80.405931773)
            Line((0, 5), (-0.118321596, 4.98))
            ThreePointArc((-0.118321596, 4.98), (-0.12, 2.5), (-0.12, 0))
            Line((-0.12, 0), (0, -0.12))
            Line((0, -0.12), (5.916079783, -0.12))
            Line((5.916079783, -0.12), (5.916079783, 0))
        make_face()
    fillet7_piece_3 = extrude(amount=5.8, mode=Mode.PRIVATE)
    fillet7_piece_3 = split(fillet7_piece_3, bisect_by=Plane(origin=(-15.957282579, 1.368762804, -37.211149414), z_dir=(0, 0.9396926207859081, 0.34202014332566943)), keep=Keep.TOP, mode=Mode.PRIVATE)
    add(fillet7_piece_3)
    with BuildSketch(Plane(origin=(16, 0.2, -31), x_dir=(1, 0, 0), z_dir=(0, 1, 0))) as fillet7_piece_4_section:
        with BuildLine():
            CenterArc((6, 5.916079783), FILLET7_R, 180, 80.405931773)
            Line((0, 5.916079783), (-0.12, 5.916079783))
            Line((-0.12, 5.916079783), (-0.12, 0))
            Line((-0.12, 0), (0, -0.12))
            ThreePointArc((0, -0.12), (2.5, -0.12), (4.98, -0.118321596))
            Line((4.98, -0.118321596), (5, 0))
        make_face()
    fillet7_piece_4 = extrude(amount=5.8, mode=Mode.PRIVATE)
    fillet7_piece_4 = split(fillet7_piece_4, bisect_by=Plane(origin=(16.527662271, 0.235819169, -34.098412357), z_dir=(0, 0.9396926207859081, 0.34202014332566943)), keep=Keep.TOP, mode=Mode.PRIVATE)
    add(fillet7_piece_4)

    # Sketch21 → Cut-Extrude16 (cut)
    with BuildSketch(Plane(origin=(23, 0, 0), x_dir=(0, 0, -1), z_dir=(1, 0, 0))):
        with Locations((17, 2.55)):
            Rectangle(SKETCH21_W, SKETCH21_H)
        with Locations((8, 2.55)):
            Rectangle(SKETCH21_W, SKETCH21_H)
    extrude(amount=-CUT_EXTRUDE16_DEPTH, mode=Mode.SUBTRACT)


solid = part.part
